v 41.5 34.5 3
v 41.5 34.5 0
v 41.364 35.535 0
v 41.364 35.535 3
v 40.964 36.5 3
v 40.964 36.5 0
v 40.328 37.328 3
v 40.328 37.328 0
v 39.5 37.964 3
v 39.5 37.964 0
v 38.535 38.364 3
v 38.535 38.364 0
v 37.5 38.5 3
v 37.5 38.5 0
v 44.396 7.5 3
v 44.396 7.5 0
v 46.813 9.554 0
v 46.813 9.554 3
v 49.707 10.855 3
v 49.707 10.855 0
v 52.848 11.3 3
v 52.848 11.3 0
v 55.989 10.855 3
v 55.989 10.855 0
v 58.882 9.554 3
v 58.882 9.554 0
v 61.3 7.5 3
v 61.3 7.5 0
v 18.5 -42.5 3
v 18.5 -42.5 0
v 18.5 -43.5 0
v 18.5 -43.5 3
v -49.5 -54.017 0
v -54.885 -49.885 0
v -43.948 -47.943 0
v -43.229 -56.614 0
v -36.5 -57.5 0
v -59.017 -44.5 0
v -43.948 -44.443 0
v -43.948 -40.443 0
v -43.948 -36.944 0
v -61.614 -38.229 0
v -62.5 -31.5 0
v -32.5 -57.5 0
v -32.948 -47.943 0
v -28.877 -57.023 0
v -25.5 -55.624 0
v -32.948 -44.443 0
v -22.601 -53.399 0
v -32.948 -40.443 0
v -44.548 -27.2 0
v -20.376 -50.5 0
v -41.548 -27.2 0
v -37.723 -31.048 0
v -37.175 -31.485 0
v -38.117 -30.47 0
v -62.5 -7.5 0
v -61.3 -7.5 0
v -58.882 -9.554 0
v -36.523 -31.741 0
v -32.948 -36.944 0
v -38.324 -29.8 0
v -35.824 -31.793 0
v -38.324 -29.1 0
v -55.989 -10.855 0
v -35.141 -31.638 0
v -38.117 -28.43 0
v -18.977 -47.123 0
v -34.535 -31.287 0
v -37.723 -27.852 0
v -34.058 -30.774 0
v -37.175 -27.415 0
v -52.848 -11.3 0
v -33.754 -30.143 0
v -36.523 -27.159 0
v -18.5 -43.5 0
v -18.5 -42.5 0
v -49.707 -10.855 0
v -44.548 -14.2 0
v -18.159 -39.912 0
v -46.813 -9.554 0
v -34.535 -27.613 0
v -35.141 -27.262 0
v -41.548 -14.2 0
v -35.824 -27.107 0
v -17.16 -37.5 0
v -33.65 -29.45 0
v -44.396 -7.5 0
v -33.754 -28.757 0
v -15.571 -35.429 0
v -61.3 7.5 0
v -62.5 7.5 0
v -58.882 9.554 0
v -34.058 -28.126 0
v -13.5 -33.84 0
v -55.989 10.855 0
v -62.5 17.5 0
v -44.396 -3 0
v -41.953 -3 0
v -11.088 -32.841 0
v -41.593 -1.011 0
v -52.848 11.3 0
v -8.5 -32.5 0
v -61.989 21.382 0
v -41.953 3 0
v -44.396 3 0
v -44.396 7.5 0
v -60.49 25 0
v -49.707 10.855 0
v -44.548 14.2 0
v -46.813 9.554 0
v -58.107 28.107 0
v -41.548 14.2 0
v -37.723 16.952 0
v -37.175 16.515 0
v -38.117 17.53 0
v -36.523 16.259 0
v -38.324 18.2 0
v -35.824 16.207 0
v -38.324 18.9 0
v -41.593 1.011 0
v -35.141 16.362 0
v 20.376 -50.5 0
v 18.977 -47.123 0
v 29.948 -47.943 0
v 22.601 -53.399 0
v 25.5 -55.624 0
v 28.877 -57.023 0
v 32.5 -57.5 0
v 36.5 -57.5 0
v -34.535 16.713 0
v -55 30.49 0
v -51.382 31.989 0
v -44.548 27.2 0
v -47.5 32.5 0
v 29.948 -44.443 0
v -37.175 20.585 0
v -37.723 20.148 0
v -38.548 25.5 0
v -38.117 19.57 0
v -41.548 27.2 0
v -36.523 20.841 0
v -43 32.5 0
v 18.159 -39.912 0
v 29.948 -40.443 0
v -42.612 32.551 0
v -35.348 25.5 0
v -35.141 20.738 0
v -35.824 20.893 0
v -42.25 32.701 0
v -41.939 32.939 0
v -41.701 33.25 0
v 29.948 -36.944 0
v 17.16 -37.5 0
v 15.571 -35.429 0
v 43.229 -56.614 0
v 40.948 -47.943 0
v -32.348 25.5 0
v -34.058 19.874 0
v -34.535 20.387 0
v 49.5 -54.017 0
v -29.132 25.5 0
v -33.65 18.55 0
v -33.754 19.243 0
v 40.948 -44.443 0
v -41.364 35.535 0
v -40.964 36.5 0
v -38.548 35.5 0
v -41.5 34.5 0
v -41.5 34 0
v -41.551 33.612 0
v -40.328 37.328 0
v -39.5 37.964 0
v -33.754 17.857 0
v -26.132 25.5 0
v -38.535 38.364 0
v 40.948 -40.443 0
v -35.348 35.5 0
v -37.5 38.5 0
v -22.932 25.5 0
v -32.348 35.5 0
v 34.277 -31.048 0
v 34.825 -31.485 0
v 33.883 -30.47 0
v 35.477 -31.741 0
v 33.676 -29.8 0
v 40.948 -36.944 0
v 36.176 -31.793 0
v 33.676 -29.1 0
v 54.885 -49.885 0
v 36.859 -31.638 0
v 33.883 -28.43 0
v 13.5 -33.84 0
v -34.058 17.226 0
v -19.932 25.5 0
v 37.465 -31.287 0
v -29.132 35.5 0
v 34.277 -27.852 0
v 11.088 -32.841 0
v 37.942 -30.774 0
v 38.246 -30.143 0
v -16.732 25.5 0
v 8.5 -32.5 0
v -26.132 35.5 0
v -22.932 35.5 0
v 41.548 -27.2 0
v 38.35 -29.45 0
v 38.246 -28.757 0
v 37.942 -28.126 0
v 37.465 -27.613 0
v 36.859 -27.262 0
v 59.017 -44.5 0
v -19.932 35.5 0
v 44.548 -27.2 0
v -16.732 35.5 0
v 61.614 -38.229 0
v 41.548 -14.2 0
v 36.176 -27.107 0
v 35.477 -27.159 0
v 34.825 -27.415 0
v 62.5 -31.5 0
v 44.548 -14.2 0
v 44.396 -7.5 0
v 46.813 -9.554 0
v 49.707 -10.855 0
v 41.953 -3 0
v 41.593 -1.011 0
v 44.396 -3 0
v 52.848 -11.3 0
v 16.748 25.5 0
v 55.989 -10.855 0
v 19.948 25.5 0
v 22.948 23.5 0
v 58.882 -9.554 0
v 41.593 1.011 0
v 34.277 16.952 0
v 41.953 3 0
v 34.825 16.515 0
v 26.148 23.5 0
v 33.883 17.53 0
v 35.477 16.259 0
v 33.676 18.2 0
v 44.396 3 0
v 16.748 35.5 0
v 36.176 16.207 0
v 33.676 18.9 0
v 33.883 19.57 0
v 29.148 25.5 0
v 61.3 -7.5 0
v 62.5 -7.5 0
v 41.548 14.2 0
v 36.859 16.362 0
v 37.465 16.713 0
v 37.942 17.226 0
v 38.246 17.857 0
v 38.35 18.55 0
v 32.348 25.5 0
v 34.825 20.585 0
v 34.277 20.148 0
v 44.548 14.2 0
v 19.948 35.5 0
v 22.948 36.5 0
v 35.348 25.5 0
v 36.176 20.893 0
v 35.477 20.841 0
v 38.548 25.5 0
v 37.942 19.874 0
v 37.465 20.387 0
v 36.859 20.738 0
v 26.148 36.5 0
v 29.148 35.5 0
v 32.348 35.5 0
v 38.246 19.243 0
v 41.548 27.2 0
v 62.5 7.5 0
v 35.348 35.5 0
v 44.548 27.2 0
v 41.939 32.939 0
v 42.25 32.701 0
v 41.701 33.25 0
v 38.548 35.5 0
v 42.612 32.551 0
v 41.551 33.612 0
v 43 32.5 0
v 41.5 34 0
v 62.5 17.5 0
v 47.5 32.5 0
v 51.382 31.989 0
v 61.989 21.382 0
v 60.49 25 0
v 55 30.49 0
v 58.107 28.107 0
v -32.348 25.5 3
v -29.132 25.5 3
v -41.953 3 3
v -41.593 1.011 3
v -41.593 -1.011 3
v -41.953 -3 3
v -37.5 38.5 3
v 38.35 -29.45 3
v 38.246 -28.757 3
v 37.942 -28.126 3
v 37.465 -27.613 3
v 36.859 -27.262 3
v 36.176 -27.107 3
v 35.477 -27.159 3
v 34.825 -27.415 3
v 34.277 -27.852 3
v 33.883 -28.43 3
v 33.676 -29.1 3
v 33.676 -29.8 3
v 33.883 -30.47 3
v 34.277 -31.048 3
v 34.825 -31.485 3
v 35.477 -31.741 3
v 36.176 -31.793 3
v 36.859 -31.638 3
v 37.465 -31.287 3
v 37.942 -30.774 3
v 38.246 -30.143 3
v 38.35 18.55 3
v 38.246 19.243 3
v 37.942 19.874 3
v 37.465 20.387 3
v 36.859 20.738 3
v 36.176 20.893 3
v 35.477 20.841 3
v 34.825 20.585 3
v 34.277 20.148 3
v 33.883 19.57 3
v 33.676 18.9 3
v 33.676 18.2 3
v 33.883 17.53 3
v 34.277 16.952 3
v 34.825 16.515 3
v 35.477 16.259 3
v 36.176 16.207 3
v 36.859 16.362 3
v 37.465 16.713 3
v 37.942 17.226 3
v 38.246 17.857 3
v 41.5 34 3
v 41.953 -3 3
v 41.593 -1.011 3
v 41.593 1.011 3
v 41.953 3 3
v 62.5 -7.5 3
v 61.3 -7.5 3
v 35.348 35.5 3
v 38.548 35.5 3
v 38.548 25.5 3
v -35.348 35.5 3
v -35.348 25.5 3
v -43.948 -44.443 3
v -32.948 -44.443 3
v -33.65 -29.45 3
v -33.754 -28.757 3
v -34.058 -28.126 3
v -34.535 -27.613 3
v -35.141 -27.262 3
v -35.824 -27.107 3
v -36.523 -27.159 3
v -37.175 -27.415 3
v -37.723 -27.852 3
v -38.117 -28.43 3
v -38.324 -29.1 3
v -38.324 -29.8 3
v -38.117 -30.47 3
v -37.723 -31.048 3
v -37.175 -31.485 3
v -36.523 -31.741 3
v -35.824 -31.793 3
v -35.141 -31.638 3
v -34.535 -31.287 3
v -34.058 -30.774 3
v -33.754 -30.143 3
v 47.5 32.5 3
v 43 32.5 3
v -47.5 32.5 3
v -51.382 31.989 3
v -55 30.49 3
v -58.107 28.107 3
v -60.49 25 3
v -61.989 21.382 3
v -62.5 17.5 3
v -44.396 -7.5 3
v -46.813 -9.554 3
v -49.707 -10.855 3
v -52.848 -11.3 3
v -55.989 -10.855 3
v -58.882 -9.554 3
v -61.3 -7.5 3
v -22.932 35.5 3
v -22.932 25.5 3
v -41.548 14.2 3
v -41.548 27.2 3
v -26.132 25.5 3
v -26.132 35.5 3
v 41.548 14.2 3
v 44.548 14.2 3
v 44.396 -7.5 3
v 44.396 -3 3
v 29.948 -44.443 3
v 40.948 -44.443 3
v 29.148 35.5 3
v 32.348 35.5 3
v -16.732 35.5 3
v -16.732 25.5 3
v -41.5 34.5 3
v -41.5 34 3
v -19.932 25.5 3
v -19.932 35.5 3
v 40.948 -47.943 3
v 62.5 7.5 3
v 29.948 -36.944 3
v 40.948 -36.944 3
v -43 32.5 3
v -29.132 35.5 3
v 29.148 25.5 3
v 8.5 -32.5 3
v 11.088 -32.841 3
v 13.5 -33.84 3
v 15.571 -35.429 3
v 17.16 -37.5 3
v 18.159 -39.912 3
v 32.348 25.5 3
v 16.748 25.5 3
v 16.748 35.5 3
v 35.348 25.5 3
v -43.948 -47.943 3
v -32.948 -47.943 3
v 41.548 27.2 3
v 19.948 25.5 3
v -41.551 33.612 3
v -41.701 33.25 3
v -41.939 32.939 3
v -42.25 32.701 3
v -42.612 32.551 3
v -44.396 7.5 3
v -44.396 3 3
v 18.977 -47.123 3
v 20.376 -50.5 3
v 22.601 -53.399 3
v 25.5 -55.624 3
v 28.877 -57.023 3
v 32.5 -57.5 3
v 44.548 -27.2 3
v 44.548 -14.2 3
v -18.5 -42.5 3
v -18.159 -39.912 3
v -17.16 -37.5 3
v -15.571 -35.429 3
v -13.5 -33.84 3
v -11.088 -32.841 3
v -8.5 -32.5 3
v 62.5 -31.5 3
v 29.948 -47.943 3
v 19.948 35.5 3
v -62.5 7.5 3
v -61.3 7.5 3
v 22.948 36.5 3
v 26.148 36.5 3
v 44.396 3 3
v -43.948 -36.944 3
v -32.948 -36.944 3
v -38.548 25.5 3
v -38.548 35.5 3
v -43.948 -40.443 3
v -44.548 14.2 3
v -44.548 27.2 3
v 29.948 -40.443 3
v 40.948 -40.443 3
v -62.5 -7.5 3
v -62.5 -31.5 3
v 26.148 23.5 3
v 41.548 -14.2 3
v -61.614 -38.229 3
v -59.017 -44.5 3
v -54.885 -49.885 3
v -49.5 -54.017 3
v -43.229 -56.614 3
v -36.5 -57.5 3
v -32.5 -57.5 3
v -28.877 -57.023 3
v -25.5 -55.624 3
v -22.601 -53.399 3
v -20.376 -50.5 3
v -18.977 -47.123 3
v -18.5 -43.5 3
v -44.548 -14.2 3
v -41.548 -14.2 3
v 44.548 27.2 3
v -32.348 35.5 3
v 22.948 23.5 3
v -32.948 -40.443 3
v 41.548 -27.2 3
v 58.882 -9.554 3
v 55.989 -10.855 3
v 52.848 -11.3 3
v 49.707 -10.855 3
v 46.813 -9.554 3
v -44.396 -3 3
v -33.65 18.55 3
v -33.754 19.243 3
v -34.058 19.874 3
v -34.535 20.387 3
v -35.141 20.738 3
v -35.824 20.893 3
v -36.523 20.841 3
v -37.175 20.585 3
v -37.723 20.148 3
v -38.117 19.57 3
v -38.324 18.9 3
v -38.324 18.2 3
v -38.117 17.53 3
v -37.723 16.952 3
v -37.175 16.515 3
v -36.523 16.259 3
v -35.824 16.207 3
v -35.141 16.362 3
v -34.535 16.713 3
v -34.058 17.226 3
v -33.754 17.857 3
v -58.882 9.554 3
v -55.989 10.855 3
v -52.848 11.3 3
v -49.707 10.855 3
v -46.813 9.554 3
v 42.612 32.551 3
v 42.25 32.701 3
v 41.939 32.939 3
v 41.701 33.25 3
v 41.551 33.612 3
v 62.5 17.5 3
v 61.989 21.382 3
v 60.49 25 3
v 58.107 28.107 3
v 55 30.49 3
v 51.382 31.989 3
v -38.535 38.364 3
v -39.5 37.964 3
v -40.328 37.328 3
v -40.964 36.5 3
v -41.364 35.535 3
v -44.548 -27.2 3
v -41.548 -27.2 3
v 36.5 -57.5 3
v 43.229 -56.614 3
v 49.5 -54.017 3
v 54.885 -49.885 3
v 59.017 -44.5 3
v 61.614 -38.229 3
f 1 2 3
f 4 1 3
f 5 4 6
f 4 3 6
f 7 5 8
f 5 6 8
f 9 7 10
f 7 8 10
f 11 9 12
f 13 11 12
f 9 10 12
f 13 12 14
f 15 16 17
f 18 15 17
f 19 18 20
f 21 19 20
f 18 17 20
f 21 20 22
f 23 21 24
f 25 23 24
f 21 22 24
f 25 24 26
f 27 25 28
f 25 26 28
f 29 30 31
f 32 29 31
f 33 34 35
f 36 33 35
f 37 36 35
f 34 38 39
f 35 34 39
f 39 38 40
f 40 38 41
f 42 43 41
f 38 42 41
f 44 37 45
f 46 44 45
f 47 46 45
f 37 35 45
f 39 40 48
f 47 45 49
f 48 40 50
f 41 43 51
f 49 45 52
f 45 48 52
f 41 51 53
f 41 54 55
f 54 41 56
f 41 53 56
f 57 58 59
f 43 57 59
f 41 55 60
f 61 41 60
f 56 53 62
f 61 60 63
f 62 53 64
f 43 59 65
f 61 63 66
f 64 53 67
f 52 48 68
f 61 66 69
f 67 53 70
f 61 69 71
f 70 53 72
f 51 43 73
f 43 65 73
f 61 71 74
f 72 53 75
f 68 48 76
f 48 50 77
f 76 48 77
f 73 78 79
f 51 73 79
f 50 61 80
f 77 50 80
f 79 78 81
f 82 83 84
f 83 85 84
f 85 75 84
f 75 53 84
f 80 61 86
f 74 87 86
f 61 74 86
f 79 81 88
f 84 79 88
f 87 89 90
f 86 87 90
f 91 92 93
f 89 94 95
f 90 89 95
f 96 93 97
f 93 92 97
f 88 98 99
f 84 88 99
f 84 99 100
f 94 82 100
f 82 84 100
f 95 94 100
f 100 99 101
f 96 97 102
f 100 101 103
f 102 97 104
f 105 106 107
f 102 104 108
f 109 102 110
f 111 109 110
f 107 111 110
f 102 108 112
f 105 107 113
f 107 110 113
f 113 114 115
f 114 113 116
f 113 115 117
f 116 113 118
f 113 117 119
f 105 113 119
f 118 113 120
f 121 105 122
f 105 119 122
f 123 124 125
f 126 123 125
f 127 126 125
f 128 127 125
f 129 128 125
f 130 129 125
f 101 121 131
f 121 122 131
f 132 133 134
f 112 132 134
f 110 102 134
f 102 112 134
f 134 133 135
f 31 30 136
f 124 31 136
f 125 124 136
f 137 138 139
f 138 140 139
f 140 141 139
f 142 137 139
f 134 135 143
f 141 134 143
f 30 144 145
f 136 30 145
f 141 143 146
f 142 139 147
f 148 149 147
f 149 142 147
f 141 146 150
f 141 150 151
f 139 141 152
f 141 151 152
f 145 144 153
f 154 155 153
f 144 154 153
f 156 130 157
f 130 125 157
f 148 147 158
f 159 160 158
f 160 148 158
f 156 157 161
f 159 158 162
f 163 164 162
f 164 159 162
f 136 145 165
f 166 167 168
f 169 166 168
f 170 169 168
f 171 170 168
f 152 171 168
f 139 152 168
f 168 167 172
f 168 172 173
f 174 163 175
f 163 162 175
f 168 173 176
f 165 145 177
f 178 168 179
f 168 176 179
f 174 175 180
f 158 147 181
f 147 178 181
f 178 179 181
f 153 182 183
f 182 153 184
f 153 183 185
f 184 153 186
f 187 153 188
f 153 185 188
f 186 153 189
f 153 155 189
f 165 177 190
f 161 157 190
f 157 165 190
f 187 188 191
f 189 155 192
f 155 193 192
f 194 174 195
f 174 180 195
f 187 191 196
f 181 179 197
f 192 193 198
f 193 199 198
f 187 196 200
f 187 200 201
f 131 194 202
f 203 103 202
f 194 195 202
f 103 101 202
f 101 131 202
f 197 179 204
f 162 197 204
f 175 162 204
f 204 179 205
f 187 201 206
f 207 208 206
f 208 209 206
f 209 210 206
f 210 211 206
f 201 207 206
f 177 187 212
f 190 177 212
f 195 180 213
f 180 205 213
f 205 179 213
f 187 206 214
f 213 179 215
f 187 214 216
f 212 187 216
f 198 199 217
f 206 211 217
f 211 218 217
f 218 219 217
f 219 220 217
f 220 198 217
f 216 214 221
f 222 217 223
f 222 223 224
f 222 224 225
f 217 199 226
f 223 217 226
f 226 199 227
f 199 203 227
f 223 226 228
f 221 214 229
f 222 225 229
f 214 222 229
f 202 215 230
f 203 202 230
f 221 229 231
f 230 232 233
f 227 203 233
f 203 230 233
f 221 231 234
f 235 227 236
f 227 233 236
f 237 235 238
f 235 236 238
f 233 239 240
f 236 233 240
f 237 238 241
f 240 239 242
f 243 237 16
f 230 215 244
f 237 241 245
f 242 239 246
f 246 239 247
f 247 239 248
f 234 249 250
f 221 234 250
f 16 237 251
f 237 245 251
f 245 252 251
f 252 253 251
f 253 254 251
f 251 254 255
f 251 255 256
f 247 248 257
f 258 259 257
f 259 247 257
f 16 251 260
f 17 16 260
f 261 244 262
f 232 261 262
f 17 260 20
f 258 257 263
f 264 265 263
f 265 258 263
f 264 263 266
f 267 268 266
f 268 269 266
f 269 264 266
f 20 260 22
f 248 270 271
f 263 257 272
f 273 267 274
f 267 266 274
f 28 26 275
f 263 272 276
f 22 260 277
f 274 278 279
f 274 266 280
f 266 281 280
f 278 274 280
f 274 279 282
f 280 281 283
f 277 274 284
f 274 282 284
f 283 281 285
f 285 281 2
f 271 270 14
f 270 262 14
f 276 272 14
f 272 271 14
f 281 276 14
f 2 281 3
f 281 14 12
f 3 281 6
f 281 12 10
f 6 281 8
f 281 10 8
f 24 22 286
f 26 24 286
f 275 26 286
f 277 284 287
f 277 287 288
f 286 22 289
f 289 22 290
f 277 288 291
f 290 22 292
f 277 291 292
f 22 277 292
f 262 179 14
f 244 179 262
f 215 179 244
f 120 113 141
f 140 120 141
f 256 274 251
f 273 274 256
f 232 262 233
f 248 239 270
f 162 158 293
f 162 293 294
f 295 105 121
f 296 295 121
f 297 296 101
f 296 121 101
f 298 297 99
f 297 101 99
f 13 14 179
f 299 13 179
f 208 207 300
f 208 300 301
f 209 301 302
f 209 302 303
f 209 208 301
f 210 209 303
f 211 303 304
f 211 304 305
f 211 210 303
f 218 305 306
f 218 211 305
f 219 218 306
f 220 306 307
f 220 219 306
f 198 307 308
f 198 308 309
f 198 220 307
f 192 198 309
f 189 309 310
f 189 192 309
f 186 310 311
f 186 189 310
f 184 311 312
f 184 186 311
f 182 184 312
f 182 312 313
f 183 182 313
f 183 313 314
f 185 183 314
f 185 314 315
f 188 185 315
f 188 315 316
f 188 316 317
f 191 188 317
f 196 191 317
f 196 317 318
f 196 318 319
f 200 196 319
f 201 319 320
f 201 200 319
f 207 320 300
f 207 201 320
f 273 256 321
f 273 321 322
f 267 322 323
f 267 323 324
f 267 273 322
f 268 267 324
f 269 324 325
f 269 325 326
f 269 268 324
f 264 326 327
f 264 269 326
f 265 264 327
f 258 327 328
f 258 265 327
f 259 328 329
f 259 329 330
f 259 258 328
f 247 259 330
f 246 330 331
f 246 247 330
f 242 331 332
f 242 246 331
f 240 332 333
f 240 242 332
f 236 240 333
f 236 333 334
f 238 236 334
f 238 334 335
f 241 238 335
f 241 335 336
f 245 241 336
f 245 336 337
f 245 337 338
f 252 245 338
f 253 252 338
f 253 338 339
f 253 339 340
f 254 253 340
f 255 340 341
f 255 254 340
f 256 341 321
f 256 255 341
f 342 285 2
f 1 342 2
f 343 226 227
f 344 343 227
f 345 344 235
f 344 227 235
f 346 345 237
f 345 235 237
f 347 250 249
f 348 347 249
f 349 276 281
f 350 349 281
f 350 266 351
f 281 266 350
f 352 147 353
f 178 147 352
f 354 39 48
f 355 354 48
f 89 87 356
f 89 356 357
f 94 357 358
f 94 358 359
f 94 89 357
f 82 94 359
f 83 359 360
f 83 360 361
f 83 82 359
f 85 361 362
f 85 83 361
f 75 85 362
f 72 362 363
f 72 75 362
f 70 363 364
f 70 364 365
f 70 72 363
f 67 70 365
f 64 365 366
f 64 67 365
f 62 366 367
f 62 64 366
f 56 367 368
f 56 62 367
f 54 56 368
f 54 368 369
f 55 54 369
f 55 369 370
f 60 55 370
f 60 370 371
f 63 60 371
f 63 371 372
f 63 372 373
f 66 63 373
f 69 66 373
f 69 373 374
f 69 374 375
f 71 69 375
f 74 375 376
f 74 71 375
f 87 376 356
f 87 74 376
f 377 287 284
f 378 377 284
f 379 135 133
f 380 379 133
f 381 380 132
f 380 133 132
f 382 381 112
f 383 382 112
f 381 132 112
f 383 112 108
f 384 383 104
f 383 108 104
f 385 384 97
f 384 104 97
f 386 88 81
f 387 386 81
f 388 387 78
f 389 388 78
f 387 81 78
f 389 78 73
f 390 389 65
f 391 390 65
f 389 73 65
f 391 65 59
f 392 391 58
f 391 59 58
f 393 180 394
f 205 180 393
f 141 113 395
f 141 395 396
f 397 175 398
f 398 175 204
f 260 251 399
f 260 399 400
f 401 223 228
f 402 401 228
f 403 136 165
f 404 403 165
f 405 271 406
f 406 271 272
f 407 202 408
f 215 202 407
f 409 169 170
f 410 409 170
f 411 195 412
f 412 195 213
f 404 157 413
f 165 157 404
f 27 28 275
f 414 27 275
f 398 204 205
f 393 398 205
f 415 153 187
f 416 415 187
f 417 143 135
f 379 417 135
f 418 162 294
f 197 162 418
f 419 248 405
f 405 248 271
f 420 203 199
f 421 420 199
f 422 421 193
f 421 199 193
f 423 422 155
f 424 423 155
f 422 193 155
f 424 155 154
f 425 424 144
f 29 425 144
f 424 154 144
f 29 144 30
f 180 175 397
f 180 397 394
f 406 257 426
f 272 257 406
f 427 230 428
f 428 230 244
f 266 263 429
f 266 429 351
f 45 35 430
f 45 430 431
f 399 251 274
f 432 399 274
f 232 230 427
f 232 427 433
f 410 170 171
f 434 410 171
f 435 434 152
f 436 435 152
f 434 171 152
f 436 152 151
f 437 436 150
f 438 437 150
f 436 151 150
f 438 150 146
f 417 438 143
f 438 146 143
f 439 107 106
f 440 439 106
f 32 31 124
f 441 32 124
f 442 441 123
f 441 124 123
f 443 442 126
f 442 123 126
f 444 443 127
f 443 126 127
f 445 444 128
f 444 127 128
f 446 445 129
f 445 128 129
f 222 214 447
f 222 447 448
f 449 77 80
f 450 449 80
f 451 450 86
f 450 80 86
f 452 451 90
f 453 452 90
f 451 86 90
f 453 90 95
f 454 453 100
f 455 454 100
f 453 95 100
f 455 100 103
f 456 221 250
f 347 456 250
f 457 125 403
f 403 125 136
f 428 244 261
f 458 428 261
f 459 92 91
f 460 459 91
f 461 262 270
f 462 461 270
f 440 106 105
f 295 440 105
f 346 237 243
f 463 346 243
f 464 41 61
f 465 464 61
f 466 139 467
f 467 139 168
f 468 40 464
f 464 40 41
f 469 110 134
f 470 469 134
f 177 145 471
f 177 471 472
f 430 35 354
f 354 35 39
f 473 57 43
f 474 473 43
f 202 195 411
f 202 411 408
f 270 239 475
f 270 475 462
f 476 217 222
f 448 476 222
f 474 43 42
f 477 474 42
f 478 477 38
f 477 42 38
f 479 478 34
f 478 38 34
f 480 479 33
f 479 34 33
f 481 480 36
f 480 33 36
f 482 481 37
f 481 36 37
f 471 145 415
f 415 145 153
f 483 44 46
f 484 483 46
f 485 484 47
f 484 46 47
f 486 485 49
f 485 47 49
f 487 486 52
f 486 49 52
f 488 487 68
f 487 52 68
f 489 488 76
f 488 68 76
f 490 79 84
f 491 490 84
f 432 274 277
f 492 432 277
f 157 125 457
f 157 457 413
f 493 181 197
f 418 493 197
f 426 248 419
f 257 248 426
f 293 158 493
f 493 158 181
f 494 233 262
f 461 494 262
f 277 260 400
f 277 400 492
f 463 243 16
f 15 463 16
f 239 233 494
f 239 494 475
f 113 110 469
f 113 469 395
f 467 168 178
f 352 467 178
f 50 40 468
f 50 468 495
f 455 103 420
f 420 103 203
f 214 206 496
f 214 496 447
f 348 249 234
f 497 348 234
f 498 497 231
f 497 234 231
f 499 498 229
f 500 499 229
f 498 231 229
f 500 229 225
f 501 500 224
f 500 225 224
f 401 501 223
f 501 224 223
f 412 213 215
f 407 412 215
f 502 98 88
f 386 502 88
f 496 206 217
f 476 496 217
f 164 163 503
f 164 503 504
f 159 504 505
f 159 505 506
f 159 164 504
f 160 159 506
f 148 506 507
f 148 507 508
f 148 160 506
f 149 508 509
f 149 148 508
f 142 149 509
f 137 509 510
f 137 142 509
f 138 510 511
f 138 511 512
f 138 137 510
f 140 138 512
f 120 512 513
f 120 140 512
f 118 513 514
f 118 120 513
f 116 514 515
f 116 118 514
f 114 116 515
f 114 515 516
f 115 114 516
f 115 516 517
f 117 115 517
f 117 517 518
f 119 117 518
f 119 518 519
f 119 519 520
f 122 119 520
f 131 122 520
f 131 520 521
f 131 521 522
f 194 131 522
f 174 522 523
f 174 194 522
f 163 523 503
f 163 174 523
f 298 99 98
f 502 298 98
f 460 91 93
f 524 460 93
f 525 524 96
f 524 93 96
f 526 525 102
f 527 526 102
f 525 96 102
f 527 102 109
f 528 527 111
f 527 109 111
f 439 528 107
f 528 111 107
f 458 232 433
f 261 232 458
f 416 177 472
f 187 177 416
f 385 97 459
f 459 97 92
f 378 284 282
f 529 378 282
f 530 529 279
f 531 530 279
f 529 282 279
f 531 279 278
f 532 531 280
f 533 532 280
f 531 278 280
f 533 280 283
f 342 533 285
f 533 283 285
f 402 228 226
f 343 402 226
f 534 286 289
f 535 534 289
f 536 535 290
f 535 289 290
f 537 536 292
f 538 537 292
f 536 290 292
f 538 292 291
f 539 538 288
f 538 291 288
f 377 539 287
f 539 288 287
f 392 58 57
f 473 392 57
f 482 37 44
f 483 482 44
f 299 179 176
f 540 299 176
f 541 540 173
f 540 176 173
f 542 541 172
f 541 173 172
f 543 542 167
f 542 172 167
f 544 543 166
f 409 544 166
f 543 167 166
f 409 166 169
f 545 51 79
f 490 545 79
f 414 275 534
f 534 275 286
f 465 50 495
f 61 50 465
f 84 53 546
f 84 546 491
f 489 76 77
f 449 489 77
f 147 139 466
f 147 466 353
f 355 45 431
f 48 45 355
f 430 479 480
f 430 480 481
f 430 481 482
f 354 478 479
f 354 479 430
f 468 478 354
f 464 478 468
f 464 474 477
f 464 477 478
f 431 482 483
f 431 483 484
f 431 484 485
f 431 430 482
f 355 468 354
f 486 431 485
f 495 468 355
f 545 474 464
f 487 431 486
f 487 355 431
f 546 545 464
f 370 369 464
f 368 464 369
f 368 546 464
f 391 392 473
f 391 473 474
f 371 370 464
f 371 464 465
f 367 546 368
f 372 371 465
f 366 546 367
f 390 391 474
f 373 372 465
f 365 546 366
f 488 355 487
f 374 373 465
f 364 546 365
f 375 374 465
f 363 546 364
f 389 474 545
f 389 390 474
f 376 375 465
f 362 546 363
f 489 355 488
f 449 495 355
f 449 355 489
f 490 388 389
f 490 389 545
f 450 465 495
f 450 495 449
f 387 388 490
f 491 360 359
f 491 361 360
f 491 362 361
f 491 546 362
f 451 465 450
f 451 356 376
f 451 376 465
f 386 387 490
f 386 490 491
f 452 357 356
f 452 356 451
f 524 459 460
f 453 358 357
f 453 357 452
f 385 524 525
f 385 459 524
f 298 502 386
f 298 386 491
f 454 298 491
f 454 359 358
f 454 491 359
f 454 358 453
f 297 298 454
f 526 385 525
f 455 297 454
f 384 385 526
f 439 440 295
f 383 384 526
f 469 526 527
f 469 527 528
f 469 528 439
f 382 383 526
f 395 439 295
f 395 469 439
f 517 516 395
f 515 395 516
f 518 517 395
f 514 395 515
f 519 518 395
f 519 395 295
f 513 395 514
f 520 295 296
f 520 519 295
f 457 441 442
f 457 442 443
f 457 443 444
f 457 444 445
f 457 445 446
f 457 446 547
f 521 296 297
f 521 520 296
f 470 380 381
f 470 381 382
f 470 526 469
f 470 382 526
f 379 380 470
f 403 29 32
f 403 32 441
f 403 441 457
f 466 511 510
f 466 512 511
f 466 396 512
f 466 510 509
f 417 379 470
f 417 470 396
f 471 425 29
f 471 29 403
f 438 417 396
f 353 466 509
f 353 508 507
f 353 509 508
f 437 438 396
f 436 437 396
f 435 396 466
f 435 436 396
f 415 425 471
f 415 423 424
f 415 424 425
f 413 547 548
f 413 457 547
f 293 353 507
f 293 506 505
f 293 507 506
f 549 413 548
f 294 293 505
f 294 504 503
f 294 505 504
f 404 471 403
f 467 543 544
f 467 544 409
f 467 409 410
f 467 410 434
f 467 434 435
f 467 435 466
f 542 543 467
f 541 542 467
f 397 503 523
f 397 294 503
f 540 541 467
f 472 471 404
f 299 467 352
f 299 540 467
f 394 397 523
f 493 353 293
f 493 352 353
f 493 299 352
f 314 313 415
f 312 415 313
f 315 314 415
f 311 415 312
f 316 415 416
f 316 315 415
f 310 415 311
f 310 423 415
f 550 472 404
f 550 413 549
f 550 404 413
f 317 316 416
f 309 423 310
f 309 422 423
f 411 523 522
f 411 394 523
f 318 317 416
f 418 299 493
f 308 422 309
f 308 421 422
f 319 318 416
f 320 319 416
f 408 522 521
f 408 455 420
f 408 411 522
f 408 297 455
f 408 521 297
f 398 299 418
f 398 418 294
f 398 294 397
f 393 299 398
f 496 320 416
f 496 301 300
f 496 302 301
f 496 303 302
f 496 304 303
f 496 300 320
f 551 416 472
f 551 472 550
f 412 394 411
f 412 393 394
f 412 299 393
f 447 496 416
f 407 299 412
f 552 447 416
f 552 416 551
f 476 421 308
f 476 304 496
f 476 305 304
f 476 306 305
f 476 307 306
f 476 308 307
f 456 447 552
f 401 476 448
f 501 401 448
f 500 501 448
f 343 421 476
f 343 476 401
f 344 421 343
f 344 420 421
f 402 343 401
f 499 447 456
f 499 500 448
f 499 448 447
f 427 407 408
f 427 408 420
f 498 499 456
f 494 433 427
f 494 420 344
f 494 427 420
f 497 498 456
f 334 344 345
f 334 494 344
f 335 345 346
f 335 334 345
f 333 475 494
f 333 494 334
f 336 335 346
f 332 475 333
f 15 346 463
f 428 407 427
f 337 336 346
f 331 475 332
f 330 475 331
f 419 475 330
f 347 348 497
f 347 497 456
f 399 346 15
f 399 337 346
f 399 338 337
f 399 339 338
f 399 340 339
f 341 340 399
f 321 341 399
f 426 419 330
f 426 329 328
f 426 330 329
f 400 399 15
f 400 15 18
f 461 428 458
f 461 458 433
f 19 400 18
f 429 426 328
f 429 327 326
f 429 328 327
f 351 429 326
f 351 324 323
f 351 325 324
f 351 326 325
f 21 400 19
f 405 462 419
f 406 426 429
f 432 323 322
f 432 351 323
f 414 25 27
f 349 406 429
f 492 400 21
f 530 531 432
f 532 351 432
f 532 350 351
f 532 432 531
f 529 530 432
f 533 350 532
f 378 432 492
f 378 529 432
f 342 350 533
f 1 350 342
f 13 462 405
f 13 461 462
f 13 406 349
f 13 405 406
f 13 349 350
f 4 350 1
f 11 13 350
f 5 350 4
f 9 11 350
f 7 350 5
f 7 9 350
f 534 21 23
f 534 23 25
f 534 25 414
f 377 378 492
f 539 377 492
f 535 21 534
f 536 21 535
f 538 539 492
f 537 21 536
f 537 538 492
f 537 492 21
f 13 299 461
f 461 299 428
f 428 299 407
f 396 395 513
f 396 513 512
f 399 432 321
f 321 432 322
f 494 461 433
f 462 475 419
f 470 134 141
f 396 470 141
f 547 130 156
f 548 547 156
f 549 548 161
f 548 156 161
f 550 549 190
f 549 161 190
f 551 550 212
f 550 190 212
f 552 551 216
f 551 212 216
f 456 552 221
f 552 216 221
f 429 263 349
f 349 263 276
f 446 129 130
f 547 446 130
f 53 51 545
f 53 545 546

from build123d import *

# Parameters (mm, degrees)
SKICA2_R                = 2.35
SKICA2_W                = 11
SKICA2_H                = 3.499027085
SKICA2_W_2              = 3
SKICA2_H_2              = 13
SKICA2_W_3              = 3.2
SKICA2_H_3              = 10
SKICA2_W_4              = 3.215746781
P_IDAT_VYSUNUT_M1_DEPTH = 3


with BuildPart() as part:
    # Skica2 → Přidat vysunutím1 (new body)
    with BuildSketch(Plane.XY):
        with BuildLine():
            Line((-62.5, 7.5), (-61.3, 7.5))
            ThreePointArc((-61.3, 7.5), (-52.847781356, 11.3), (-44.395562713, 7.5))
            Line((-44.395562713, 7.5), (-44.395562713, 3))
            Line((-44.395562713, 3), (-41.953287334, 3))
            ThreePointArc((-41.953287334, 3), (-41.547781356, 0), (-41.953287334, -3))
            Line((-41.953287334, -3), (-44.395562713, -3))
            Line((-44.395562713, -3), (-44.395562713, -7.5))
            ThreePointArc((-44.395562713, -7.5), (-52.847781356, -11.3), (-61.3, -7.5))
            Line((-61.3, -7.5), (-62.5, -7.5))
            Line((-62.5, -7.5), (-62.5, -16.780342451))
            Line((-62.5, -16.780342451), (-62.5, -31.5))
            ThreePointArc((-62.5, -31.5), (-54.884776311, -49.884776311), (-36.5, -57.5))
            Line((-36.5, -57.5), (-32.5, -57.5))
            ThreePointArc((-32.5, -57.5), (-22.600505063, -53.399494937), (-18.5, -43.5))
            Line((-18.5, -43.5), (-18.5, -42.5))
            ThreePointArc((-18.5, -42.5), (-15.571067812, -35.428932188), (-8.5, -32.5))
            Line((-8.5, -32.5), (8.5, -32.5))
            ThreePointArc((8.5, -32.5), (15.571067812, -35.428932188), (18.5, -42.5))
            Line((18.5, -42.5), (18.5, -43.5))
            ThreePointArc((18.5, -43.5), (22.600505063, -53.399494937), (32.5, -57.5))
            Line((32.5, -57.5), (36.5, -57.5))
            ThreePointArc((36.5, -57.5), (54.884776311, -49.884776311), (62.5, -31.5))
            Line((62.5, -31.5), (62.5, -18.974988021))
            Line((62.5, -18.974988021), (62.5, -7.5))
            Line((62.5, -7.5), (61.3, -7.5))
            ThreePointArc((61.3, -7.5), (52.847781356, -11.3), (44.395562713, -7.5))
            Line((44.395562713, -7.5), (44.395562713, -3))
            Line((44.395562713, -3), (41.953287334, -3))
            ThreePointArc((41.953287334, -3), (41.547781356, 0), (41.953287334, 3))
            Line((41.953287334, 3), (44.395562713, 3))
            Line((44.395562713, 3), (44.395562713, 7.5))
            ThreePointArc((44.395562713, 7.5), (52.847781356, 11.3), (61.3, 7.5))
            Line((61.3, 7.5), (62.5, 7.5))
            Line((62.5, 7.5), (62.5, 17.5))
            ThreePointArc((62.5, 17.5), (58.106601718, 28.106601718), (47.5, 32.5))
            Line((47.5, 32.5), (43, 32.5))
            ThreePointArc((43, 32.5), (41.939339828, 32.939339828), (41.5, 34))
            Line((41.5, 34), (41.5, 34.5))
            ThreePointArc((41.5, 34.5), (40.328427125, 37.328427125), (37.5, 38.5))
            Line((37.5, 38.5), (-37.5, 38.5))
            ThreePointArc((-37.5, 38.5), (-40.328427125, 37.328427125), (-41.5, 34.5))
            Line((-41.5, 34.5), (-41.5, 34))
            ThreePointArc((-41.5, 34), (-41.939339828, 32.939339828), (-43, 32.5))
            Line((-43, 32.5), (-47.5, 32.5))
            ThreePointArc((-47.5, 32.5), (-58.106601718, 28.106601718), (-62.5, 17.5))
            Line((-62.5, 17.5), (-62.5, 7.5))
        make_face()
        with Locations((-36, 18.55)):
            Circle(SKICA2_R, mode=Mode.SUBTRACT)
        with Locations((-36, -29.45)):
            Circle(SKICA2_R, mode=Mode.SUBTRACT)
        with Locations((36, -29.45)):
            Circle(SKICA2_R, mode=Mode.SUBTRACT)
        with Locations((36, 18.55)):
            Circle(SKICA2_R, mode=Mode.SUBTRACT)
        with Locations((-38.447781356, -46.193013209)):
            Rectangle(SKICA2_W, SKICA2_H, mode=Mode.SUBTRACT)
        with Locations((-38.447781356, -38.693986123)):
            Rectangle(SKICA2_W, SKICA2_H, mode=Mode.SUBTRACT)
        with Locations((-43.047781356, -20.7)):
            Rectangle(SKICA2_W_2, SKICA2_H_2, mode=Mode.SUBTRACT)
        with Locations((-43.047781356, 20.7)):
            Rectangle(SKICA2_W_2, SKICA2_H_2, mode=Mode.SUBTRACT)
        with Locations((43.047781356, -20.7)):
            Rectangle(SKICA2_W_2, SKICA2_H_2, mode=Mode.SUBTRACT)
        with Locations((43.047781356, 20.7)):
            Rectangle(SKICA2_W_2, SKICA2_H_2, mode=Mode.SUBTRACT)
        with Locations((-36.947781356, 30.5)):
            Rectangle(SKICA2_W_3, SKICA2_H_3, mode=Mode.SUBTRACT)
        with Locations((36.947781356, 30.5)):
            Rectangle(SKICA2_W_3, SKICA2_H_3, mode=Mode.SUBTRACT)
        with Locations((30.747781356, 30.5)):
            Rectangle(SKICA2_W_3, SKICA2_H_3, mode=Mode.SUBTRACT)
        with Locations((24.547781356, 30)):
            Rectangle(SKICA2_W_3, SKICA2_H_2, mode=Mode.SUBTRACT)
        with Locations((35.447781356, -38.693986123)):
            Rectangle(SKICA2_W, SKICA2_H, mode=Mode.SUBTRACT)
        with Locations((-30.739907966, 30.5)):
            Rectangle(SKICA2_W_4, SKICA2_H_3, mode=Mode.SUBTRACT)
        with Locations((-24.532034575, 30.5)):
            Rectangle(SKICA2_W_3, SKICA2_H_3, mode=Mode.SUBTRACT)
        with Locations((-18.332034575, 30.5)):
            Rectangle(SKICA2_W_3, SKICA2_H_3, mode=Mode.SUBTRACT)
        with Locations((18.347781356, 30.5)):
            Rectangle(SKICA2_W_3, SKICA2_H_3, mode=Mode.SUBTRACT)
        with Locations((35.447781356, -46.193013209)):
            Rectangle(SKICA2_W, SKICA2_H, mode=Mode.SUBTRACT)
    extrude(amount=P_IDAT_VYSUNUT_M1_DEPTH)


solid = part.part
